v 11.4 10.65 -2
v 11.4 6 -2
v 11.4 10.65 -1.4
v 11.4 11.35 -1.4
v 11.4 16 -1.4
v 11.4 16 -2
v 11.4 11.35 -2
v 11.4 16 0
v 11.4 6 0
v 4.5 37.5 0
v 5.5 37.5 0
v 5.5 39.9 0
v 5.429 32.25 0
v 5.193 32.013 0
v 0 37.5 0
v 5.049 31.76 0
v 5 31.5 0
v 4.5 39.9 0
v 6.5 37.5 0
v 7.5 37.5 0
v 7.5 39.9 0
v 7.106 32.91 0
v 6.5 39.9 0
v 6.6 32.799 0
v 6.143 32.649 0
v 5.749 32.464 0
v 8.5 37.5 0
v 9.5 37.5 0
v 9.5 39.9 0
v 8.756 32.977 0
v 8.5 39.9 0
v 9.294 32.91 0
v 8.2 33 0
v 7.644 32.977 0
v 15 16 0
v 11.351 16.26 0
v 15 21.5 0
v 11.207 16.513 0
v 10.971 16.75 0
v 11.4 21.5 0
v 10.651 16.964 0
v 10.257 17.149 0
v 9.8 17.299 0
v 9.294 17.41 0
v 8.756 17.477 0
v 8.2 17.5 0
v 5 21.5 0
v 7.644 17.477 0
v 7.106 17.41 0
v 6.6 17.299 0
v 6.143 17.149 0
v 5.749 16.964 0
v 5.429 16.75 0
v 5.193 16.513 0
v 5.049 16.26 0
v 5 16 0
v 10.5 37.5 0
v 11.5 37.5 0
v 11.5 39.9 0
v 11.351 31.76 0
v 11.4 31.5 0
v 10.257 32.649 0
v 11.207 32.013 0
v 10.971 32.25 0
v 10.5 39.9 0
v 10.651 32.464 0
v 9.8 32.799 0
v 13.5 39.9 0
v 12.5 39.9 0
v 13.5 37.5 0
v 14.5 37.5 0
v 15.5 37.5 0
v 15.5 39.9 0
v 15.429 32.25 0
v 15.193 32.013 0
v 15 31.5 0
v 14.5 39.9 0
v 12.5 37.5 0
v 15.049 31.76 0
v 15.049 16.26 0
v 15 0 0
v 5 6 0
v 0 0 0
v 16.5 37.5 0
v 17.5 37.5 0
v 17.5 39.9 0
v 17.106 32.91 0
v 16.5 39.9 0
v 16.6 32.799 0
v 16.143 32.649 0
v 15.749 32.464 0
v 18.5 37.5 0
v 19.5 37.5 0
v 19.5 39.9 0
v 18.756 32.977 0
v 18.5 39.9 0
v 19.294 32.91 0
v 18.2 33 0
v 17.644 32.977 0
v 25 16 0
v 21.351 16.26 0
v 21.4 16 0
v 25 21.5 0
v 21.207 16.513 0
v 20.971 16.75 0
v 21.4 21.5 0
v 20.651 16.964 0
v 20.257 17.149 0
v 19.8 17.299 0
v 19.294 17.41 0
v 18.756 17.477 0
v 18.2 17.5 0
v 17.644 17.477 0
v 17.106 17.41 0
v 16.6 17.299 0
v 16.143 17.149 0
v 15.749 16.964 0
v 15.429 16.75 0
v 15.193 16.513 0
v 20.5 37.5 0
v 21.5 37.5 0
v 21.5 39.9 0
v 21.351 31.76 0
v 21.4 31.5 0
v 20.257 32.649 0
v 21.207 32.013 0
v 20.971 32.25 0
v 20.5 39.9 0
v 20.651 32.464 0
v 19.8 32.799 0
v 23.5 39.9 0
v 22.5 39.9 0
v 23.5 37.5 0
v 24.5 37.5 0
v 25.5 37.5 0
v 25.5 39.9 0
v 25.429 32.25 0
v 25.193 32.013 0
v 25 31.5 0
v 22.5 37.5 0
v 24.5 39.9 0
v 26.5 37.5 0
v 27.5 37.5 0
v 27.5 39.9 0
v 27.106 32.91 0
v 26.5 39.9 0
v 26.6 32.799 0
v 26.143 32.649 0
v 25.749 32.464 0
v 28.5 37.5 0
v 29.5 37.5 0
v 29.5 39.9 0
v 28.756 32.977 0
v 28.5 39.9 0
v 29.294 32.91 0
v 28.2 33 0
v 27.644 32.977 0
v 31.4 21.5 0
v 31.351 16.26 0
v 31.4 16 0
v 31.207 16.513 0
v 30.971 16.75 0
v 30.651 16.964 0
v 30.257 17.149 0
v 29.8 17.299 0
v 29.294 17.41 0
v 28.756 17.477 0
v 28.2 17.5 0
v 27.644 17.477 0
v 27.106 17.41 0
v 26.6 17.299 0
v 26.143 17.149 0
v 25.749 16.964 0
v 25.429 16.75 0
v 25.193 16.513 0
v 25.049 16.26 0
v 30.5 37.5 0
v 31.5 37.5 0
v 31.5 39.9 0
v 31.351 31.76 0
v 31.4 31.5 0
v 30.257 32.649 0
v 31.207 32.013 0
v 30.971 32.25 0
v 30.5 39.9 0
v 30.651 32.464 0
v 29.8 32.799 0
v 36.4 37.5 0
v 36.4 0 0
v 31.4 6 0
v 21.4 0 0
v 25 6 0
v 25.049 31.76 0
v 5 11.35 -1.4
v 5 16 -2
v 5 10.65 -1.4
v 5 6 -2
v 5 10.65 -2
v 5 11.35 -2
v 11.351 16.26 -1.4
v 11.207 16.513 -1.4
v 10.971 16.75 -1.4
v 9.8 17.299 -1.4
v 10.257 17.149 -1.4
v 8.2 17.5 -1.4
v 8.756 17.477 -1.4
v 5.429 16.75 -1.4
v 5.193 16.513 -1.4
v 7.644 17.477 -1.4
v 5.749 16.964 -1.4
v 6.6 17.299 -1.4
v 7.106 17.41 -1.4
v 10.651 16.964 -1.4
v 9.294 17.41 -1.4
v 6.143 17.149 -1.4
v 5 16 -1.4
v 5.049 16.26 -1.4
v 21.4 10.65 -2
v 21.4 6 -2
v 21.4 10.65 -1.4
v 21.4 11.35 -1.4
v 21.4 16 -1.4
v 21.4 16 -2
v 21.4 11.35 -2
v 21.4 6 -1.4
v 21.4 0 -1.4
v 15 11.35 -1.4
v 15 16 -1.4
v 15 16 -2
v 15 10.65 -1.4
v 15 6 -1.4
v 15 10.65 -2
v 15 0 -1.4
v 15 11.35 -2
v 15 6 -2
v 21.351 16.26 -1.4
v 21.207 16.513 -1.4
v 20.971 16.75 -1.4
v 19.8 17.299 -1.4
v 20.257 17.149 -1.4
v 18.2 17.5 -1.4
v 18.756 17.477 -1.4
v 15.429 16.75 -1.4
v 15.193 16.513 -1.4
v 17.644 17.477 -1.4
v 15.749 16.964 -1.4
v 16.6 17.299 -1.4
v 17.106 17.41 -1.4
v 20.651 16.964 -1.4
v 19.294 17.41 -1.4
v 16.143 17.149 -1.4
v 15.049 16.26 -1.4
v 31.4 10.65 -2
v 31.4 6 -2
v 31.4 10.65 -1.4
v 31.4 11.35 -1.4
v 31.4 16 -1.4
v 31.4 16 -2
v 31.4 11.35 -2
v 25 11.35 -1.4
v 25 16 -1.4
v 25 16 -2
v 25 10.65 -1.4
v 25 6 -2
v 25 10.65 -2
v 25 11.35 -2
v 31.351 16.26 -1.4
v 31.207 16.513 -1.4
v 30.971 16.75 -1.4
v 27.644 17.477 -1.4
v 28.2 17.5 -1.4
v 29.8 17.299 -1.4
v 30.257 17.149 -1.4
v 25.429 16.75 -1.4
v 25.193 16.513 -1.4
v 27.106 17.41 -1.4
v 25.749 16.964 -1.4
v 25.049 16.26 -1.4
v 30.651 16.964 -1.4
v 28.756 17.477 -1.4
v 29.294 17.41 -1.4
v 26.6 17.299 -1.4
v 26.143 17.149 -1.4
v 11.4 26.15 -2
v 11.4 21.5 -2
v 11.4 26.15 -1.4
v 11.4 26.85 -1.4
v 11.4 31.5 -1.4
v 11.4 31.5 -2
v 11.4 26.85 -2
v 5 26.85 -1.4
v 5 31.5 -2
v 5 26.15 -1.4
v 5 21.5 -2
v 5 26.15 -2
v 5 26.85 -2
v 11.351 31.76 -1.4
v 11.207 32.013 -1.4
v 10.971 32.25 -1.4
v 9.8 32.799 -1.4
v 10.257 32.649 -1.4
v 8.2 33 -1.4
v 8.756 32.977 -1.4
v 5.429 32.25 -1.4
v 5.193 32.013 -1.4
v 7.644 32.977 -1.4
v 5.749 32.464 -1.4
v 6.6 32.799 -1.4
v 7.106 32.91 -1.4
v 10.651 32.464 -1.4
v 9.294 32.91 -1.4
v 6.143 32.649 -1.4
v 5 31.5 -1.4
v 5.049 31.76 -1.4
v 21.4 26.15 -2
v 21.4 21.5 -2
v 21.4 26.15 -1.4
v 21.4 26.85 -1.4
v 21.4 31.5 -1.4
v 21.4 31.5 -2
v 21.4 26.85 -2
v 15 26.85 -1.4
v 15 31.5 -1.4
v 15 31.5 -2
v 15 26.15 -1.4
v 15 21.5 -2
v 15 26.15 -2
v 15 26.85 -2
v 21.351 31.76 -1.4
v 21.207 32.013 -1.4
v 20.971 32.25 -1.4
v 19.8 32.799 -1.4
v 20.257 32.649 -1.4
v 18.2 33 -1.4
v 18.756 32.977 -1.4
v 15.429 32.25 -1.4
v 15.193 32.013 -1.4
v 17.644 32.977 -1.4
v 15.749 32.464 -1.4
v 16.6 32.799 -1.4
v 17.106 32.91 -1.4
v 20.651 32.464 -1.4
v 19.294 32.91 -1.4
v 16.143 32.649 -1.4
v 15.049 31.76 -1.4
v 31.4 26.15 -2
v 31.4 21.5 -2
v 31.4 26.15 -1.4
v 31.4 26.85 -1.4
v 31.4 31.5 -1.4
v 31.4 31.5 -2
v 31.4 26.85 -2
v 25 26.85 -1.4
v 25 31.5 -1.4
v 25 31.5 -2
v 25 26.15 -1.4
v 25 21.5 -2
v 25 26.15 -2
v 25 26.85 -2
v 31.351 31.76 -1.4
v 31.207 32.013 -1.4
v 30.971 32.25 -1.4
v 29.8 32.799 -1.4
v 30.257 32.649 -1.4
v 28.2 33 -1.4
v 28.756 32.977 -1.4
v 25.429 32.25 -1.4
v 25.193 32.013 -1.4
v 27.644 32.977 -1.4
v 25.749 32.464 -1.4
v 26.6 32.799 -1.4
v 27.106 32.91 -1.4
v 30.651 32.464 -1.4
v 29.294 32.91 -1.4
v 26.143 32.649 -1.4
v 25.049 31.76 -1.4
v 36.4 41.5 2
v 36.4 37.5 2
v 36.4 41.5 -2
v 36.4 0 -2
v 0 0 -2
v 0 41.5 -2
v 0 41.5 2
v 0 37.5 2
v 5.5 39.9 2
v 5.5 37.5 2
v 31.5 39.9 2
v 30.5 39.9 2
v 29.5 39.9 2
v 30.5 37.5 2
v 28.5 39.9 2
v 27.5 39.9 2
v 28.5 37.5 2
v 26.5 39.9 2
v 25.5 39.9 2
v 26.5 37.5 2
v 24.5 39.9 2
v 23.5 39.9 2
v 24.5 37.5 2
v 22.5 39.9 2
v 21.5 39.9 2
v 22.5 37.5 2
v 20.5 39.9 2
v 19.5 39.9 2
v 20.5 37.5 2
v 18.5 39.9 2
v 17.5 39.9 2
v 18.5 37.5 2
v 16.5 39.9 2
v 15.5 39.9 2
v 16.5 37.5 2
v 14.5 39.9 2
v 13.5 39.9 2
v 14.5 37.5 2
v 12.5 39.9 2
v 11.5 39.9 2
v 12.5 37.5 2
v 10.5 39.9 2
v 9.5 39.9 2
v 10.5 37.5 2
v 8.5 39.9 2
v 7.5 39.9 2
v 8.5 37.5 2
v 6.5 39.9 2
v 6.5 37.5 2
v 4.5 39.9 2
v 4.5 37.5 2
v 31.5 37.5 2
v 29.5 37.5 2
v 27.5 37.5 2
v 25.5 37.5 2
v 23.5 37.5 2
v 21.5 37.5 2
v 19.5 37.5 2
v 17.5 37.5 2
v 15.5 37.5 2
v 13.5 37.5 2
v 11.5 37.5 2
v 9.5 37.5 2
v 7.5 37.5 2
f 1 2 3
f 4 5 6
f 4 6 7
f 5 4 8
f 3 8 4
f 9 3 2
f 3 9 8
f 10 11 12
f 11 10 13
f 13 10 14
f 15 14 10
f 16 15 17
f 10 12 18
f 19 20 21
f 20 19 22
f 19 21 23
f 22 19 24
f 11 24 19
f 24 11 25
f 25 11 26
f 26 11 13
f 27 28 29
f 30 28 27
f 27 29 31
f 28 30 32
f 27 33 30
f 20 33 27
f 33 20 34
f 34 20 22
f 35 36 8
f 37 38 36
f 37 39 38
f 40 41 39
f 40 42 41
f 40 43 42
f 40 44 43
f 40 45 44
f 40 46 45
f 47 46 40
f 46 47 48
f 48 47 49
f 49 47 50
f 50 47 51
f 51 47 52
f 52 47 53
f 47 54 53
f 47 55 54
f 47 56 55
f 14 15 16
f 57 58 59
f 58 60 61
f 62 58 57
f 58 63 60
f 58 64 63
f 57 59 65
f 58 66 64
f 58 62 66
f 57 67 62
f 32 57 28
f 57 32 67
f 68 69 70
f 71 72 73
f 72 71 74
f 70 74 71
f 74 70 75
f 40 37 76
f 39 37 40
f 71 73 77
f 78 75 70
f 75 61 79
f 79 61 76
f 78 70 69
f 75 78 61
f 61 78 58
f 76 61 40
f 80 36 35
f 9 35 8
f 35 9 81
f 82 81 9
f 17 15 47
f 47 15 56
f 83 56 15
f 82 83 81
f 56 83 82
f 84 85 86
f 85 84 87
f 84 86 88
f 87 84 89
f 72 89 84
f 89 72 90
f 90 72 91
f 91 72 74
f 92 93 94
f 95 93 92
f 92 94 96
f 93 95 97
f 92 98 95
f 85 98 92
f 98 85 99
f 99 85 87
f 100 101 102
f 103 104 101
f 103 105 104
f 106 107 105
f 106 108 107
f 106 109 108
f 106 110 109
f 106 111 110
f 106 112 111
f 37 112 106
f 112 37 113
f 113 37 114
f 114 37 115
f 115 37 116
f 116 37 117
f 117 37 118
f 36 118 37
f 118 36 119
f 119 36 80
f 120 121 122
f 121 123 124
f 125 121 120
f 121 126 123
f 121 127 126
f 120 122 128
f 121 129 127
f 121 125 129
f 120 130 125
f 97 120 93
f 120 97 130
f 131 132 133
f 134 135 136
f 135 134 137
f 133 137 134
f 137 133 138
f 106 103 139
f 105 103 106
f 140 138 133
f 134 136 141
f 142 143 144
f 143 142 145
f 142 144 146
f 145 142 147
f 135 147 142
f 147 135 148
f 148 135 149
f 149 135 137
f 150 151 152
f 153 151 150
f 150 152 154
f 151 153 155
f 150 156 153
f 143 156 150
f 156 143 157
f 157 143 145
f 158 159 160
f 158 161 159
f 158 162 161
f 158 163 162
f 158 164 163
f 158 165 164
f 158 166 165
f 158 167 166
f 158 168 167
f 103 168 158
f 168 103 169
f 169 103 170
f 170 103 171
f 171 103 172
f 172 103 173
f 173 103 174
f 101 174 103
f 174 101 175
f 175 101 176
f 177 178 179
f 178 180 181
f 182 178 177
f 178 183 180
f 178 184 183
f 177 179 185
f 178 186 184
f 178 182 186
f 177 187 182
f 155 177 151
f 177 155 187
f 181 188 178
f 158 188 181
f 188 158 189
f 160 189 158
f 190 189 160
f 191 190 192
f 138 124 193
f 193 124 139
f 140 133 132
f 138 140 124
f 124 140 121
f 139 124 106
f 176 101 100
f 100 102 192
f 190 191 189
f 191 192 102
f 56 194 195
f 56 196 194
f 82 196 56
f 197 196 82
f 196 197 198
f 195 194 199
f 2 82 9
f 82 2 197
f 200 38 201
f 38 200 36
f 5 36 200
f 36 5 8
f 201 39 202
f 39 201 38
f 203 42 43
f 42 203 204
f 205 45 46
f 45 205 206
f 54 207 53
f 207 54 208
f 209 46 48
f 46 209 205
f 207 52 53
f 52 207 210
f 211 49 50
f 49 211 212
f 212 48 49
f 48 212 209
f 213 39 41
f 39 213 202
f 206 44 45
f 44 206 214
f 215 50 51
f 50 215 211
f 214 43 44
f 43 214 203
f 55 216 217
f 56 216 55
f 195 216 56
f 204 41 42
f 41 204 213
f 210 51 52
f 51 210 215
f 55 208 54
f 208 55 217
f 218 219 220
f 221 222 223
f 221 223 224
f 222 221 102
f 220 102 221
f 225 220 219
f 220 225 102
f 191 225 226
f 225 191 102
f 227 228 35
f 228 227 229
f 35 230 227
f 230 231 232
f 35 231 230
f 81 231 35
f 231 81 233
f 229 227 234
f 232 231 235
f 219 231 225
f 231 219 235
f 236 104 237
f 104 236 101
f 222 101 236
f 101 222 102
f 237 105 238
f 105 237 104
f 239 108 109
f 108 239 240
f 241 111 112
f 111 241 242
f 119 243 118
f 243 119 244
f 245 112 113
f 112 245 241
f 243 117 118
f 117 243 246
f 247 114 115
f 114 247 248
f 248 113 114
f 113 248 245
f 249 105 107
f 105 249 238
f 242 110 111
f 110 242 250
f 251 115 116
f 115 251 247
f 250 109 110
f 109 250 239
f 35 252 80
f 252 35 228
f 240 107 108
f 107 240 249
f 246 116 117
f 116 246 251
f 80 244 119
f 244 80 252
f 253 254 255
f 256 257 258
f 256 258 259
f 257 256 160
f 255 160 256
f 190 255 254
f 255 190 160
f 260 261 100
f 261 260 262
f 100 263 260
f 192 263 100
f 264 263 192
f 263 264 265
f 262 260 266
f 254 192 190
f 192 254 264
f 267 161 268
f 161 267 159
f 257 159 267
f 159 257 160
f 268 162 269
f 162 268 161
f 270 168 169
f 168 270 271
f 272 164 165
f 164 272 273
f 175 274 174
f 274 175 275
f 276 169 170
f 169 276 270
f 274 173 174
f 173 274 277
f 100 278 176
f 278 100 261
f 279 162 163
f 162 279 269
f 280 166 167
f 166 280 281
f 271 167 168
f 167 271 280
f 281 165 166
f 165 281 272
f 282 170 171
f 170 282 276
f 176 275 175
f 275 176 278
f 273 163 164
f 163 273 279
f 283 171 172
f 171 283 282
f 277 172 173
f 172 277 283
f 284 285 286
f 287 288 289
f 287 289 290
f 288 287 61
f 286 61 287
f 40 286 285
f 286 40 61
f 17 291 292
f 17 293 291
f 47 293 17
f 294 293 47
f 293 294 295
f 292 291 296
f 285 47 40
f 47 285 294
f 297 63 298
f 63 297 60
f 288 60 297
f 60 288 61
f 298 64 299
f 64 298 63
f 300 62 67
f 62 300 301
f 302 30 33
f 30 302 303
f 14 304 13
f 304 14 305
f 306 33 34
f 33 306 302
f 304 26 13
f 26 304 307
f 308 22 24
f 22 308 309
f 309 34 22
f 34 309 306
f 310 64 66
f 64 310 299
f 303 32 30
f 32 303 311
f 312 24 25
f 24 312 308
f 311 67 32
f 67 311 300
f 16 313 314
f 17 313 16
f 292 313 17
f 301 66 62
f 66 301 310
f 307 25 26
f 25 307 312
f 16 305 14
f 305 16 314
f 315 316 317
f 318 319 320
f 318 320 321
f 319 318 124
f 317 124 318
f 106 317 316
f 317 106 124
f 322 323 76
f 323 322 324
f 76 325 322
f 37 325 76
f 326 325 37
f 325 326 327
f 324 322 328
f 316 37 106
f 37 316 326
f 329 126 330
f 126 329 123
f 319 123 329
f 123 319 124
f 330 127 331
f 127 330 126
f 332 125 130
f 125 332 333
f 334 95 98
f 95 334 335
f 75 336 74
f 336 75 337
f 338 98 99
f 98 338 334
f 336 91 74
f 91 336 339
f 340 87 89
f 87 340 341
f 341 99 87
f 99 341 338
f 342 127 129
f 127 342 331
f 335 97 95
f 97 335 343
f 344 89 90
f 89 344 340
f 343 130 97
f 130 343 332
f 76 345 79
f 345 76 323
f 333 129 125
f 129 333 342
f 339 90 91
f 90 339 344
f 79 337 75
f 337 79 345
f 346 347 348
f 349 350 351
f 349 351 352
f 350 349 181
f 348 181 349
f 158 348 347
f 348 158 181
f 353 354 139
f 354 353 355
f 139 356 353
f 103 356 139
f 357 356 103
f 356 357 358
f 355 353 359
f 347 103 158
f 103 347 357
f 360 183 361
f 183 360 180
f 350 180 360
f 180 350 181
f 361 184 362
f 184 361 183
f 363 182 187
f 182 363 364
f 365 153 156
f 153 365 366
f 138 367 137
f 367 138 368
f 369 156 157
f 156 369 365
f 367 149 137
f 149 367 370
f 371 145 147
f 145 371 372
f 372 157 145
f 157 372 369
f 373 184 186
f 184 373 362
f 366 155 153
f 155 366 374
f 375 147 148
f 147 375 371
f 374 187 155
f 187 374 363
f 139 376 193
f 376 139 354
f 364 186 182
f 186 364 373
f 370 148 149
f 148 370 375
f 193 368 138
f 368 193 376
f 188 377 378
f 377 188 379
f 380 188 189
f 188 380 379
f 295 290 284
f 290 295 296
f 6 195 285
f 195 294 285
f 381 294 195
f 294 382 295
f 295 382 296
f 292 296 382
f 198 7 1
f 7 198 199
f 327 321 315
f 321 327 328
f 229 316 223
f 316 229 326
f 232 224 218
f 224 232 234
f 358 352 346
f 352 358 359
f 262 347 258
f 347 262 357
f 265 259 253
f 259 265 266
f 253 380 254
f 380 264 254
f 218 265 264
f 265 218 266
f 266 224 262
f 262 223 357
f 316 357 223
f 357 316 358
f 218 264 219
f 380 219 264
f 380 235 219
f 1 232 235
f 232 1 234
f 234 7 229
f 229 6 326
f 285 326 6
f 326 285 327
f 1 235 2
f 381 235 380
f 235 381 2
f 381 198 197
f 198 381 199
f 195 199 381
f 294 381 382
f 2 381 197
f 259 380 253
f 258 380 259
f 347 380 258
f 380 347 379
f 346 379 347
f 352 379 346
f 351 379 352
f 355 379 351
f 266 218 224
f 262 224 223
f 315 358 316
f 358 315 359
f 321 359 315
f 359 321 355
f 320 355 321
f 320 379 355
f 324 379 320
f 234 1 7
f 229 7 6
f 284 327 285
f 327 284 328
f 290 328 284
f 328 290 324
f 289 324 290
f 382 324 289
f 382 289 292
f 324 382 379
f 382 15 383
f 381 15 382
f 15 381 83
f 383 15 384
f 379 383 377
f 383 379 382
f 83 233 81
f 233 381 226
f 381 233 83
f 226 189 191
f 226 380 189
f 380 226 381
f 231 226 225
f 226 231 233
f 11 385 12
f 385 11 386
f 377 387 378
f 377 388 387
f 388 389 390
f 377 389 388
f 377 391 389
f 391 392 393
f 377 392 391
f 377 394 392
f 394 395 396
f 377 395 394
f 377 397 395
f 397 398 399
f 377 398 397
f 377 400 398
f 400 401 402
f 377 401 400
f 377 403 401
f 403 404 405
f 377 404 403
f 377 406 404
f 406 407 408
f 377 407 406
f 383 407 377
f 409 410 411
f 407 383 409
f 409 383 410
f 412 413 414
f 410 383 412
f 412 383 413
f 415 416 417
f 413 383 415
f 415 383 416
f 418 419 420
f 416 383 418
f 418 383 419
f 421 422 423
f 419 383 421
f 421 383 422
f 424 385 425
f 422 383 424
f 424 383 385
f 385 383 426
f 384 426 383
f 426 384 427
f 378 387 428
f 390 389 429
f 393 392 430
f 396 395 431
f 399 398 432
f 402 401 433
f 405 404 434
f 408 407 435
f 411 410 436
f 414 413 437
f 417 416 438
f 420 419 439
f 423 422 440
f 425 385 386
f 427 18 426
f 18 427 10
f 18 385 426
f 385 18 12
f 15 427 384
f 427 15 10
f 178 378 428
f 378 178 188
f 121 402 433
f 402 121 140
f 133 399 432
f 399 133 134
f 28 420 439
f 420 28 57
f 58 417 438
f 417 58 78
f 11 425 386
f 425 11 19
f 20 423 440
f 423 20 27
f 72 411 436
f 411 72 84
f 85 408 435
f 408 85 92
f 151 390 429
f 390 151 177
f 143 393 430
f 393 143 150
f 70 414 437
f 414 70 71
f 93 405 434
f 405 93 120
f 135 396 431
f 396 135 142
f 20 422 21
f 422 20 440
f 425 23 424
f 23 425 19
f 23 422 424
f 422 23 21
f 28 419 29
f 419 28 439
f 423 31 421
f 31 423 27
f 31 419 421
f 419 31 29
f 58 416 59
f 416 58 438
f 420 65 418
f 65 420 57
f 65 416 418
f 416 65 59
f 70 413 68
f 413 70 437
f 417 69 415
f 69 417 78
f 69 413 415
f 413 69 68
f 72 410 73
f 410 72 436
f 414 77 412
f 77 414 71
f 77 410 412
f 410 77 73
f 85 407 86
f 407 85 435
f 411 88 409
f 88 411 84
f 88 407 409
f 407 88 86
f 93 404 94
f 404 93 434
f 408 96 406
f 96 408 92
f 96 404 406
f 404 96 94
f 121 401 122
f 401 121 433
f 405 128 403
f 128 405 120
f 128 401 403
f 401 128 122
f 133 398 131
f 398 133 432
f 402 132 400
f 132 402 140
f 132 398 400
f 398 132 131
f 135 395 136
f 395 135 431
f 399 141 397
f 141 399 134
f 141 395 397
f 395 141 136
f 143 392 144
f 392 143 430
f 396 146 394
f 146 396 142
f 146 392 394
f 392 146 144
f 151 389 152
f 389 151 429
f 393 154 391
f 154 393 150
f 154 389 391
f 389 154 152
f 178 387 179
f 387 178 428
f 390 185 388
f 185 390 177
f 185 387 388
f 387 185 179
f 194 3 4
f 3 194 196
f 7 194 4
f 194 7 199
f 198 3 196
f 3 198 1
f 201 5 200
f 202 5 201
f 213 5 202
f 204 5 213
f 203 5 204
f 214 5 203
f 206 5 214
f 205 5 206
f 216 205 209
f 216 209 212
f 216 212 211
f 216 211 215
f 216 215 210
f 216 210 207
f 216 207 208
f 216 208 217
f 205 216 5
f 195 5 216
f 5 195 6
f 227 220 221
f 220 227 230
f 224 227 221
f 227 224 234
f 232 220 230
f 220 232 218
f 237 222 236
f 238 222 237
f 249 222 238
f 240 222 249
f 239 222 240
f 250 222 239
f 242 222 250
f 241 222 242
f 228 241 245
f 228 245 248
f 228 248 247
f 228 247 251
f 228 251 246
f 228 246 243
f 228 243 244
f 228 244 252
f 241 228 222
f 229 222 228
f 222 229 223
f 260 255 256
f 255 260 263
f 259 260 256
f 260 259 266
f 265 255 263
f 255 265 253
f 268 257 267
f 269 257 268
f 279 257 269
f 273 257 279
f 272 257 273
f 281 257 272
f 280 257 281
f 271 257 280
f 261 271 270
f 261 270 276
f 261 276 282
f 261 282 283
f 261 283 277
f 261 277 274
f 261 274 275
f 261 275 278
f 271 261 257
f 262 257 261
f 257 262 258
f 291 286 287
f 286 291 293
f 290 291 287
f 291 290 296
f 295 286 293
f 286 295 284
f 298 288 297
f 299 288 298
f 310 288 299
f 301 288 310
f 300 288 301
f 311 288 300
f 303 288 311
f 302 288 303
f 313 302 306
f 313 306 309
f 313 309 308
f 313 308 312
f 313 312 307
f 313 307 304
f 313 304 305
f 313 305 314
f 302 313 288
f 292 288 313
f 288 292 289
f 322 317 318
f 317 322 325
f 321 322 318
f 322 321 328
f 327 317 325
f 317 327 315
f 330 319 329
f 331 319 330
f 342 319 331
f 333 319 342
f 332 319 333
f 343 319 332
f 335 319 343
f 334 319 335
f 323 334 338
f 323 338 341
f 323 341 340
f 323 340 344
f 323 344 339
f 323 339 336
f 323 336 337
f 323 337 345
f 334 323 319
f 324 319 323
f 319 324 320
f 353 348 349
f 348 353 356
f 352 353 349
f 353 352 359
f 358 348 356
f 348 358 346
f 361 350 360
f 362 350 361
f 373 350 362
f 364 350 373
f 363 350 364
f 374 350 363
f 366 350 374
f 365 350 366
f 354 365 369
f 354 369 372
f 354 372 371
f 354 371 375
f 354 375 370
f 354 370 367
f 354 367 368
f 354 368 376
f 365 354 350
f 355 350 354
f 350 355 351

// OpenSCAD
//
//
//	Customizable Modular Building
//	Steve Medwin
//	April 21, 2014
//
//
$fn=36*1;
use <MCAD/shapes.scad>
// preview[view:south, tilt:top]

//
// CUSTOMIZING
//
// Number of horizontal windows
horizontal_windows=3; //[1:10]
Ncol=horizontal_windows;
// Number of vertical windows
vertical_windows=2; //[1:5]
Nrow=vertical_windows;

show_door="yes"; //[yes,no]
show_windows="yes"; //[yes,no]
show_bricks="no"; //[yes,no]
show_roof="yes"; //[yes,no]

//
// REMAINING PARAMETERS
//
// windows
Xinit=5*1; // Distance from left edge to first window
Yinit=6*1; //5 Distance from bottom to first window row
Xspace=10*1; // Distance from left edge of window to next left edge of window
Yspace=15.5*1; // Distance from bottom of window row to next row
Zbase=2.0*1; // Thickness of wall
Xwin=6.4*1; // (6.4) Width of window
Ywin=10*1; // Height of window
Zwin=2*1; // Depth of windows
Xmuntin=0.7*1; // Height of window muntin
Ymuntin=Xmuntin;
Zmuntin=0.6*1; // Thickness of window muntin
YwinArc=0.15*1; // Parameter for top of window arc
Xjam=1.0*1; //Width of door jam

Xbase=Xinit*2+Xspace*(Ncol-1)+Xwin; // Width of wall
Ybase=Yinit*2+Yspace*(Nrow-1)+Ywin; // Height of wall without roof
Xdoor=(Xspace+Xwin)/2-Xwin-Xjam/2;

// roof
Xroof=Xbase;
Yroof=4*1; // Height of roof
Zroof=2*1; // Depth of roof in addition to wall thickness
Droof=1*1; // Size of roof crenelation

// bricks
Xbrick=6*1; // Width of bricks
Ybrick=2*1; // Height of bricks (3:1 ratio)
Zbrick=0.205*1; // Height and depth of brick grout below surface (okay at @ .21,.19)

//
//	MODULES
//
// facade
module facade(){
	translate([0,0,-Zbase]) cube([Xbase,Ybase+Yroof,Zbase]);
}

//	bricks
module bricks(){
	for (i=[0:Ybase/Ybrick]){
		translate([0,i*Ybrick-Zbrick,-Zbrick]) cube([Xbase,Zbrick,Zbrick]); // on front
		translate([0,i*Ybrick-Zbrick,-Zbase]) cube([Zbrick,Zbrick,Zbase]); // on left edge
		translate([Xbase-Zbrick,i*Ybrick-Zbrick,-Zbase]) cube([Zbrick,Zbrick,Zbase]); // on right edge	
		// add vertical lines for bricks
		for (j=[0:Xbase/Xbrick]){
			if (i/2==floor(i/2)) {
				translate([0,i*Ybrick,-Zbrick]) translate([j*Xbrick,0,0]) cube([Zbrick,Ybrick,Zbrick]);
				}
			else {
				translate([0,i*Ybrick,-Zbrick]) translate([j*Xbrick+Xbrick/2,0,0]) cube([Zbrick,Ybrick,Zbrick]);
				}
		}
	}
}

//	windows
module window(Xpos,Ypos){
	translate ([Xpos,Ypos,-Zwin-2]) cube([Xwin,Ywin,Zwin+2]); // add extra depth to improve Customizer rendering
	translate ([Xpos+Xwin/2,Ypos+Ywin,-Zwin-2]) ellipticalCylinder(Xwin/2,Ywin*YwinArc,Zwin+2);
}

//	muntins
module muntins(Xpos,Ypos){
	translate ([Xpos,Ypos+Ywin/2-Ymuntin/2,-Zwin]) cube([Xwin,Ymuntin,Zmuntin]);
	translate ([Xpos,Ypos+Ywin,-Zwin]) cube([Xwin,Ywin*YwinArc,Zmuntin]);
}

// roof
module roof(){
	Dcount=((Xbase-Xinit*2)/(Droof*2));
	XbaseP=(Dcount+1)*Droof*2-Droof;
	XinitP=(Xbase-XbaseP)/2;
	difference(){
		translate ([0,Ybase,-Zbase]) cube([Xroof,Yroof,Zbase+Zroof]);
		for (i=[0:Dcount+0]){
			translate([XinitP+i*Droof*2,Ybase,0]) cube([Droof,Yroof*0.6,Zroof]);
		} 
	}
}

// door
module door(){
	translate ([Xinit+Xspace*(floor(Ncol/2)),Yinit,-Zwin-2]) cube([Xwin,Ywin,Zwin+2]);  // add extra depth to improve Customizer rendering
	translate ([Xinit+Xspace*(floor(Ncol/2))+Xwin/2,Yinit+Ywin,-Zwin-2]) ellipticalCylinder(Xwin/2,Ywin*YwinArc,Zwin+2);
	translate ([Xinit+Xspace*(floor(Ncol/2)),0,-Zwin+Zmuntin]) cube([Xwin,Yinit,Zwin]); // bottom of door
	if (Ncol/2==floor(Ncol/2)) {  // then Ncol is even so make a double door
		translate ([Xinit+Xspace*(Ncol/2-1),Yinit,-Zwin-2]) cube([Xwin,Ywin,Zwin+2]);
 		translate ([Xinit+Xspace*(Ncol/2-1),0,-Zwin+Zmuntin]) cube([Xwin+Xspace,Yinit+Ywin+Ymuntin,Zwin]);
		translate ([Xinit+Xspace*(Ncol/2-1)+Xwin+Xdoor,Yinit,-Zwin]) cube([Xjam,Ywin/2-Ymuntin/2,Zwin]);
		translate ([Xinit+Xspace*(Ncol/2-1)+Xwin+Xdoor,Yinit+Ywin/2+Ymuntin/2,-Zwin]) cube([Xjam,Ywin/2-Ymuntin/2,Zwin]);
		translate ([Xinit+Xspace*(Ncol/2)-Xdoor-Xjam/2,Yinit+Ywin+Ymuntin,-Zwin+Zmuntin]) ellipticalCylinder((Xwin+Xspace)/2,Ywin*YwinArc*1.2,Zwin);
		}
	}

// building
module building(){
	difference(){
		facade();
	//	subtract windows
		for (i=[0:Nrow-1]){
			for (j=[0:Ncol-1]){
				if (show_windows=="yes") {
					window(Xinit+j*Xspace,Yinit+i*Yspace,0);
					}
			}
		}
		if (show_bricks=="yes") { 
			bricks(); 
			}
	}
}

//
// ASSEMBLE BUILDING
//
difference(){
	building();
	if (show_door=="yes") {
		door();
		}
	}

if (show_roof=="yes") {
	roof();
	}

// add muntins
	for (i=[0:Nrow-1]){
		for (j=[0:Ncol-1]){
			muntins(Xinit+j*Xspace,Yinit+i*Yspace,0);
		}
	}
